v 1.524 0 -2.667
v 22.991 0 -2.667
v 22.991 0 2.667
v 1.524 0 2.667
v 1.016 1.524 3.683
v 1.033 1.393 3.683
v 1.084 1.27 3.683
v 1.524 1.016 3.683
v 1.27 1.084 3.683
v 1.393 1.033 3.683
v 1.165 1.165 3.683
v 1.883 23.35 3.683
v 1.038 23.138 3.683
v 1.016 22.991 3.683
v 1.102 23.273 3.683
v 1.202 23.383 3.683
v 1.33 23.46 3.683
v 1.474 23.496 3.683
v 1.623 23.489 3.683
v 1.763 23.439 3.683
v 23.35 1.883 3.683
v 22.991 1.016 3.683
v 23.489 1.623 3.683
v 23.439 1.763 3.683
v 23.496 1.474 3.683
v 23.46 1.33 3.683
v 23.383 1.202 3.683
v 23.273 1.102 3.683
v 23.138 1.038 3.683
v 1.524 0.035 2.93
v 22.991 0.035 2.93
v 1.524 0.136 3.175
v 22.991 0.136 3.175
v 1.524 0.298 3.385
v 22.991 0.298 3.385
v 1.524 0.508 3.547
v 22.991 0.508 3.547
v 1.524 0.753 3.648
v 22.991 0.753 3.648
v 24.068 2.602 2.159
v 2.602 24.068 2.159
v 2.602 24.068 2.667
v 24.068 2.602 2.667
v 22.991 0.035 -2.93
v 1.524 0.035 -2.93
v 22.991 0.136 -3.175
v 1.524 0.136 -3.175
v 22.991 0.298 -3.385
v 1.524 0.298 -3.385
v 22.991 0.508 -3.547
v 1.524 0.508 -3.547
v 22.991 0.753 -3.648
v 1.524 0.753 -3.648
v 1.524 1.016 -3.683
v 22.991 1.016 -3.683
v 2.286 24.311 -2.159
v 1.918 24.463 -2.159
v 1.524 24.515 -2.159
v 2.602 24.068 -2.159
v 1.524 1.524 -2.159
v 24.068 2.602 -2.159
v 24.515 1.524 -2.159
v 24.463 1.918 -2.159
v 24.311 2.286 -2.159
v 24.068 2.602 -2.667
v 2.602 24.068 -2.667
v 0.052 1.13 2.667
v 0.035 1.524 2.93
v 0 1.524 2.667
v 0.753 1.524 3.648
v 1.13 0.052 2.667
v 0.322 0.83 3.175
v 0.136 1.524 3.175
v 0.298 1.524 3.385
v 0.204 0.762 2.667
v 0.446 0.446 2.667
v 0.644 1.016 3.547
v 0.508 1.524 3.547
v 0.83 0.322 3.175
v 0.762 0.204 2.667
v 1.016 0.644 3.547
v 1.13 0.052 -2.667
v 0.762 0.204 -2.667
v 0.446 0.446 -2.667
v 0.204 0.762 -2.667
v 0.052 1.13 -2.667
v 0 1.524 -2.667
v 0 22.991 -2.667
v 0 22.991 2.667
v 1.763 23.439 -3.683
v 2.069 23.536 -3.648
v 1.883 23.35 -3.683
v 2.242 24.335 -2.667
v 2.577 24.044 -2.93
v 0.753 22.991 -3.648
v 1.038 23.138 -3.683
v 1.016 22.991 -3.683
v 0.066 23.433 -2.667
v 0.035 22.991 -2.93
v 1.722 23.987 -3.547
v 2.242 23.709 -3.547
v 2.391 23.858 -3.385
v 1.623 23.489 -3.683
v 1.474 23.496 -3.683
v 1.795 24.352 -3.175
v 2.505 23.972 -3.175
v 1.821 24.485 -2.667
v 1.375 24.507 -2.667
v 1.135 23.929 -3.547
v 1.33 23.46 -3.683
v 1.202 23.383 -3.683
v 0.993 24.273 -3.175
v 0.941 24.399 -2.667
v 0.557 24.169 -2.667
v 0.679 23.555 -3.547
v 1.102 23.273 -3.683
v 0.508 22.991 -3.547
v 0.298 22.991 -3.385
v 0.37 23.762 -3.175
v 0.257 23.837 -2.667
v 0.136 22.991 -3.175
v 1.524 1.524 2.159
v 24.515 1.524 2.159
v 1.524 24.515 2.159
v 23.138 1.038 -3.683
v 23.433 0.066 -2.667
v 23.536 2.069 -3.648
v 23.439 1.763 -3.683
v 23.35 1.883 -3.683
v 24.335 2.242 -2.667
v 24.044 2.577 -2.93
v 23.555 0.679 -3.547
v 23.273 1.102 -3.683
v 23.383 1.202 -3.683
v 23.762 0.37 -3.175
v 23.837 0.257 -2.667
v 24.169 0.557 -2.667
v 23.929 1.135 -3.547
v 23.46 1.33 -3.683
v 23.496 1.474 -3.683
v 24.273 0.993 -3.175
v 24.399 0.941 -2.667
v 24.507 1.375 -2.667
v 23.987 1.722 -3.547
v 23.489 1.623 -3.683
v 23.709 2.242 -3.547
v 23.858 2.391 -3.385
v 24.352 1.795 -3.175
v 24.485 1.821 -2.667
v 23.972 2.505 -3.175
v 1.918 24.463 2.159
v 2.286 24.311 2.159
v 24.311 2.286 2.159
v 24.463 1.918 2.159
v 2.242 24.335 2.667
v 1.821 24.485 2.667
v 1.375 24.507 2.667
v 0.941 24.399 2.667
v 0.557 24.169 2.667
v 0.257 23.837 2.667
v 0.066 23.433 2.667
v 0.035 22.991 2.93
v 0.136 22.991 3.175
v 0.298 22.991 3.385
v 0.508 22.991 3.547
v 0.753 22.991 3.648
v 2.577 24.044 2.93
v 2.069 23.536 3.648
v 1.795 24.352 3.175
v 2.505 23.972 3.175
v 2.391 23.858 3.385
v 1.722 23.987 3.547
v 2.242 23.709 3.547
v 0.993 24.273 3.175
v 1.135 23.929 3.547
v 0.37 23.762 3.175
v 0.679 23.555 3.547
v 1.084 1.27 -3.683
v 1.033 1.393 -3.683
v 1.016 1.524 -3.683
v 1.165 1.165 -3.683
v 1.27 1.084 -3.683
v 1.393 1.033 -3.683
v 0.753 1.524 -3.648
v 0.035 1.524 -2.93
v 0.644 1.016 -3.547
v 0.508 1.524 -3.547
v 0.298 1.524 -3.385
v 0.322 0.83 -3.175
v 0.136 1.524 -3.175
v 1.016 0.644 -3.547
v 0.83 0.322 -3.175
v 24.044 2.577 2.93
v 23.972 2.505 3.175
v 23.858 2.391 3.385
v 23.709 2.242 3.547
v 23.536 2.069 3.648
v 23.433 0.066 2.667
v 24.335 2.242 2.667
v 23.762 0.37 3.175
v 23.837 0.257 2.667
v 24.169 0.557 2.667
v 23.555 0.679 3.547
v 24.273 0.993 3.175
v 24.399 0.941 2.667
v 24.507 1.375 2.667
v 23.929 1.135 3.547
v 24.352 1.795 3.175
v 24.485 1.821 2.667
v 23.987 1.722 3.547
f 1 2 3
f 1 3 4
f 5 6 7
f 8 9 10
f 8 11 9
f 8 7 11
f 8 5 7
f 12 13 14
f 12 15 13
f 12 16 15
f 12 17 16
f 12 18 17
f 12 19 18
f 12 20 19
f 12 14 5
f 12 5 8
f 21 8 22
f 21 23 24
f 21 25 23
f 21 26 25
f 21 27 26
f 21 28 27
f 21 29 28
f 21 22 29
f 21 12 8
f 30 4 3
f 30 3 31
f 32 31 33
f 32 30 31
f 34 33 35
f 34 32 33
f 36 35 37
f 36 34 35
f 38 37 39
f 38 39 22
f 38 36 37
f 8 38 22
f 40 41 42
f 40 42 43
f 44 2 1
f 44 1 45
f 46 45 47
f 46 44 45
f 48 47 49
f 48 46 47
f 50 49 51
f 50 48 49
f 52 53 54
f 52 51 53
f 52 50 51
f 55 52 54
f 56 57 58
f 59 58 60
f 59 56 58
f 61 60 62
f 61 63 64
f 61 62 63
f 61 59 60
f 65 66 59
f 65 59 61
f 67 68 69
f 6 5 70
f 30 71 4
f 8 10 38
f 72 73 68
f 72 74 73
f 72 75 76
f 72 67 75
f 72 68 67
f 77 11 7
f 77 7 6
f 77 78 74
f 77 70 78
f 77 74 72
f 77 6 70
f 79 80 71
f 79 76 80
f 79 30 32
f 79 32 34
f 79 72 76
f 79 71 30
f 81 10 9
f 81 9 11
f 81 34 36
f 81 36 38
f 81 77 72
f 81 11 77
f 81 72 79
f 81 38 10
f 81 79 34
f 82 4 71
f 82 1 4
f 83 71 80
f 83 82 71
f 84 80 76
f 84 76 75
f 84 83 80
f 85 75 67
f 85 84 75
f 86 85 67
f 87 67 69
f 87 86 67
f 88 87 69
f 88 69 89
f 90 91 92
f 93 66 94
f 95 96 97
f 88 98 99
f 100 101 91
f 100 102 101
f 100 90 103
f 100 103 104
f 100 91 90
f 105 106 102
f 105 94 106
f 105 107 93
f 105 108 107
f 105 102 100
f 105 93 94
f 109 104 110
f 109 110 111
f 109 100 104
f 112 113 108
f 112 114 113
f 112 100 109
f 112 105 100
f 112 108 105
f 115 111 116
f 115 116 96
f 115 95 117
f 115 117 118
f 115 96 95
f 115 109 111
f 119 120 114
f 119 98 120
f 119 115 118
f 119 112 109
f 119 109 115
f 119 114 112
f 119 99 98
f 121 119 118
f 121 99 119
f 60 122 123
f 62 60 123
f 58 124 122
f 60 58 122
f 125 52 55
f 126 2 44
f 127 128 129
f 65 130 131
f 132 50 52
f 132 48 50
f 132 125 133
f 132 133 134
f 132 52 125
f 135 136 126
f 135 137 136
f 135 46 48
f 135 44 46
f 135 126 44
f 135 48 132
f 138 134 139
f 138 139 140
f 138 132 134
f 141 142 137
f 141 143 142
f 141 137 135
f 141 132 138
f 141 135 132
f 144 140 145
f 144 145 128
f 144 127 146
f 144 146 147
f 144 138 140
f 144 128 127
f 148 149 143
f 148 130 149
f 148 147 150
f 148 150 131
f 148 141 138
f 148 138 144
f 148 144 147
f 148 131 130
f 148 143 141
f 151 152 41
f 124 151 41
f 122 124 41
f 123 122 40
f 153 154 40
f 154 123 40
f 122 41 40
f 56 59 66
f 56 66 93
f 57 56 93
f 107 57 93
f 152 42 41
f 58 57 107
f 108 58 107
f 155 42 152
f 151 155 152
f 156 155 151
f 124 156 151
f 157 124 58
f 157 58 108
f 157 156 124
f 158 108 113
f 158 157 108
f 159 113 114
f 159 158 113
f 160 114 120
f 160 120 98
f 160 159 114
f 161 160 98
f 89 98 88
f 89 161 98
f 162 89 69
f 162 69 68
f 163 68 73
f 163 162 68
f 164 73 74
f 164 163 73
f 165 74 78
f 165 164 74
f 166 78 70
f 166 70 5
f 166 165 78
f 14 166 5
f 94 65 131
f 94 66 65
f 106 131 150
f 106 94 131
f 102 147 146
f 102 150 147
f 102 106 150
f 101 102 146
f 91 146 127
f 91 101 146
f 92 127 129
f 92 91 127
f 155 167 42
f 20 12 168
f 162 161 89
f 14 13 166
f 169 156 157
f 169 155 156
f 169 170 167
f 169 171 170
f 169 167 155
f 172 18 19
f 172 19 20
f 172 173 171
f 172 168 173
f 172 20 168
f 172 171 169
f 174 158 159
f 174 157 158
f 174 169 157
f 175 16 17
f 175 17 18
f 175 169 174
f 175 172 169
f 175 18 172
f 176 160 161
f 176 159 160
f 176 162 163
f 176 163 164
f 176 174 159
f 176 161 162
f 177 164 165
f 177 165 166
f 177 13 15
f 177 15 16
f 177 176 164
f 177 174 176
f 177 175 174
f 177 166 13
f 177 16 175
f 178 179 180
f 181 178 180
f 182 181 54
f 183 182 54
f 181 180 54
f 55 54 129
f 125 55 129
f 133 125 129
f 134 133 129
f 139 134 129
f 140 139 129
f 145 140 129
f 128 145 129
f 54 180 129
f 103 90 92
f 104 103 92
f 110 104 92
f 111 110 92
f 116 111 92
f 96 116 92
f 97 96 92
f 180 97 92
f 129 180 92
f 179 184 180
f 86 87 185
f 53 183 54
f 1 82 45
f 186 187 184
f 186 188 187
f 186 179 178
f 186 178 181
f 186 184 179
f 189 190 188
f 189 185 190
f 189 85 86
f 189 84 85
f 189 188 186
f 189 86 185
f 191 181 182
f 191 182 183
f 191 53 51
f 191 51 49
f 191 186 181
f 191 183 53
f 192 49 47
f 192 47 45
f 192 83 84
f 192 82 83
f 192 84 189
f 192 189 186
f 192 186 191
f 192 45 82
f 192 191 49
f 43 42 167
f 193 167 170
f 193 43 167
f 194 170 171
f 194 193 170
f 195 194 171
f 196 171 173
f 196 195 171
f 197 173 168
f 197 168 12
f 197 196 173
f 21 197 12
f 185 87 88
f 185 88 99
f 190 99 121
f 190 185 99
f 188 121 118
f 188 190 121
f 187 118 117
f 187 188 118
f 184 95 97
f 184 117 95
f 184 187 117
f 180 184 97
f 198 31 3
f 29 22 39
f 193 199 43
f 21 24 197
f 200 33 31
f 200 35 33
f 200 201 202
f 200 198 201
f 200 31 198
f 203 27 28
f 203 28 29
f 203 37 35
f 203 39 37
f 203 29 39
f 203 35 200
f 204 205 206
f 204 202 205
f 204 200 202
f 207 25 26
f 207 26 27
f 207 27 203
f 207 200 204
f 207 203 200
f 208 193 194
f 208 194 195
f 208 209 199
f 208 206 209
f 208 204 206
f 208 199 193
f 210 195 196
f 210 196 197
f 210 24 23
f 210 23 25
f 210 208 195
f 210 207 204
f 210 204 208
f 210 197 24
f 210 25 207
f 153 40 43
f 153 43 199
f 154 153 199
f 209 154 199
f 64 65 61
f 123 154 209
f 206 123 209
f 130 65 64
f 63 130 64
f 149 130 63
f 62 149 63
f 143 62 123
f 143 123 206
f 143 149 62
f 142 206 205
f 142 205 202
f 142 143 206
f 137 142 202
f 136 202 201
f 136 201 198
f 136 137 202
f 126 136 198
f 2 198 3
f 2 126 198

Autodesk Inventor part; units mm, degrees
ref_plane "YZ Plane" through (0, 0, 0) normal (1, 0, 0) x (0, 1, 0)
ref_plane "XZ Plane" through (0, 0, 0) normal (0, 1, 0) x (-1, 0, 0)
ref_plane "XY Plane" through (0, 0, 0) normal (0, 0, 1) x (1, 0, 0)
sketch "Sketch1" plane through (0, 0, 0) normal (0, 0, 1) x (1, 0, 0)
  line L0 (0, 0) -> (-13.377, 0)
  line L1 (0, 0) -> (0, 26.67)
  line L2 (0, 26.67) -> (26.67, 0)
  line L3 (26.67, 0) -> (0, 0)
  dimension "d0" = 26.67
extrude "Extrusion1" add sketch "Sketch1" along normal mid plane 7.366
sketch "Sketch3" plane through (0, 0, 0) normal (0, 0, 1) x (1, 0, 0)
  line L0 (0, 26.67) -> (26.67, 0) projected
  line L1 (0, 0) -> (0, 26.67) projected
  line L2 (26.67, 0) -> (0, 0) projected
  line L3 (1.524, 25.146) -> (1.524, 1.524)
  line L4 (1.524, 1.524) -> (25.146, 1.524)
  line L5 (1.524, 25.146) -> (25.146, 1.524)
  dimension "d3" = 1.524
  dimension "d4" = 1.524
extrude "Extrusion2" cut sketch "Sketch3" against normal mid plane 4.318 contours L0 L4 L3
fillet "Fillet1" radius 1.524 3 edges at (0, 26.67, 0) (0, 0, 0) (26.67, 0, 0)
fillet "Fillet2" radius 1.016 6 edges at (0.4464, 0.4464, 3.683) (12.2574, 0, 3.683) (24.3987, 0.9408, 3.683) (13.335, 13.335, 3.683) (0.9408, 24.3987, 3.683) (0, 12.2574, 3.683)
fillet "Fillet3" radius 1.016 6 edges at (0.9408, 24.3987, -3.683) (13.335, 13.335, -3.683) (24.3987, 0.9408, -3.683) (12.2574, 0, -3.683) (0.4464, 0.4464, -3.683) (0, 12.2574, -3.683)
equation "\"d0\" = edgeSize"
equation "\"d1\" = partThickness"
equation "\"d3\" = edgeThickness"
equation "\"d4\" = edgeThickness"
equation "\"d5\" = mirrorThickness"
equation "\"d7\" = filetForCorners"
equation "\"d8\" = filetForFlat"
equation "\"d9\" = filetForFlat"
equation "\"edgeSize\" = 26.67"
equation "\"wallThickness\" = 1.524"
equation "\"mirrorThickness\" = 4.318"
equation "\"partThickness\" = mirrorThickness + 2 * wallThickness"
equation "\"edgeThickness\" = 1.524"
equation "\"filetForCorners\" = 1.524"
equation "\"filetForFlat\" = 1.016"
properties part number "Mirror Corner"
